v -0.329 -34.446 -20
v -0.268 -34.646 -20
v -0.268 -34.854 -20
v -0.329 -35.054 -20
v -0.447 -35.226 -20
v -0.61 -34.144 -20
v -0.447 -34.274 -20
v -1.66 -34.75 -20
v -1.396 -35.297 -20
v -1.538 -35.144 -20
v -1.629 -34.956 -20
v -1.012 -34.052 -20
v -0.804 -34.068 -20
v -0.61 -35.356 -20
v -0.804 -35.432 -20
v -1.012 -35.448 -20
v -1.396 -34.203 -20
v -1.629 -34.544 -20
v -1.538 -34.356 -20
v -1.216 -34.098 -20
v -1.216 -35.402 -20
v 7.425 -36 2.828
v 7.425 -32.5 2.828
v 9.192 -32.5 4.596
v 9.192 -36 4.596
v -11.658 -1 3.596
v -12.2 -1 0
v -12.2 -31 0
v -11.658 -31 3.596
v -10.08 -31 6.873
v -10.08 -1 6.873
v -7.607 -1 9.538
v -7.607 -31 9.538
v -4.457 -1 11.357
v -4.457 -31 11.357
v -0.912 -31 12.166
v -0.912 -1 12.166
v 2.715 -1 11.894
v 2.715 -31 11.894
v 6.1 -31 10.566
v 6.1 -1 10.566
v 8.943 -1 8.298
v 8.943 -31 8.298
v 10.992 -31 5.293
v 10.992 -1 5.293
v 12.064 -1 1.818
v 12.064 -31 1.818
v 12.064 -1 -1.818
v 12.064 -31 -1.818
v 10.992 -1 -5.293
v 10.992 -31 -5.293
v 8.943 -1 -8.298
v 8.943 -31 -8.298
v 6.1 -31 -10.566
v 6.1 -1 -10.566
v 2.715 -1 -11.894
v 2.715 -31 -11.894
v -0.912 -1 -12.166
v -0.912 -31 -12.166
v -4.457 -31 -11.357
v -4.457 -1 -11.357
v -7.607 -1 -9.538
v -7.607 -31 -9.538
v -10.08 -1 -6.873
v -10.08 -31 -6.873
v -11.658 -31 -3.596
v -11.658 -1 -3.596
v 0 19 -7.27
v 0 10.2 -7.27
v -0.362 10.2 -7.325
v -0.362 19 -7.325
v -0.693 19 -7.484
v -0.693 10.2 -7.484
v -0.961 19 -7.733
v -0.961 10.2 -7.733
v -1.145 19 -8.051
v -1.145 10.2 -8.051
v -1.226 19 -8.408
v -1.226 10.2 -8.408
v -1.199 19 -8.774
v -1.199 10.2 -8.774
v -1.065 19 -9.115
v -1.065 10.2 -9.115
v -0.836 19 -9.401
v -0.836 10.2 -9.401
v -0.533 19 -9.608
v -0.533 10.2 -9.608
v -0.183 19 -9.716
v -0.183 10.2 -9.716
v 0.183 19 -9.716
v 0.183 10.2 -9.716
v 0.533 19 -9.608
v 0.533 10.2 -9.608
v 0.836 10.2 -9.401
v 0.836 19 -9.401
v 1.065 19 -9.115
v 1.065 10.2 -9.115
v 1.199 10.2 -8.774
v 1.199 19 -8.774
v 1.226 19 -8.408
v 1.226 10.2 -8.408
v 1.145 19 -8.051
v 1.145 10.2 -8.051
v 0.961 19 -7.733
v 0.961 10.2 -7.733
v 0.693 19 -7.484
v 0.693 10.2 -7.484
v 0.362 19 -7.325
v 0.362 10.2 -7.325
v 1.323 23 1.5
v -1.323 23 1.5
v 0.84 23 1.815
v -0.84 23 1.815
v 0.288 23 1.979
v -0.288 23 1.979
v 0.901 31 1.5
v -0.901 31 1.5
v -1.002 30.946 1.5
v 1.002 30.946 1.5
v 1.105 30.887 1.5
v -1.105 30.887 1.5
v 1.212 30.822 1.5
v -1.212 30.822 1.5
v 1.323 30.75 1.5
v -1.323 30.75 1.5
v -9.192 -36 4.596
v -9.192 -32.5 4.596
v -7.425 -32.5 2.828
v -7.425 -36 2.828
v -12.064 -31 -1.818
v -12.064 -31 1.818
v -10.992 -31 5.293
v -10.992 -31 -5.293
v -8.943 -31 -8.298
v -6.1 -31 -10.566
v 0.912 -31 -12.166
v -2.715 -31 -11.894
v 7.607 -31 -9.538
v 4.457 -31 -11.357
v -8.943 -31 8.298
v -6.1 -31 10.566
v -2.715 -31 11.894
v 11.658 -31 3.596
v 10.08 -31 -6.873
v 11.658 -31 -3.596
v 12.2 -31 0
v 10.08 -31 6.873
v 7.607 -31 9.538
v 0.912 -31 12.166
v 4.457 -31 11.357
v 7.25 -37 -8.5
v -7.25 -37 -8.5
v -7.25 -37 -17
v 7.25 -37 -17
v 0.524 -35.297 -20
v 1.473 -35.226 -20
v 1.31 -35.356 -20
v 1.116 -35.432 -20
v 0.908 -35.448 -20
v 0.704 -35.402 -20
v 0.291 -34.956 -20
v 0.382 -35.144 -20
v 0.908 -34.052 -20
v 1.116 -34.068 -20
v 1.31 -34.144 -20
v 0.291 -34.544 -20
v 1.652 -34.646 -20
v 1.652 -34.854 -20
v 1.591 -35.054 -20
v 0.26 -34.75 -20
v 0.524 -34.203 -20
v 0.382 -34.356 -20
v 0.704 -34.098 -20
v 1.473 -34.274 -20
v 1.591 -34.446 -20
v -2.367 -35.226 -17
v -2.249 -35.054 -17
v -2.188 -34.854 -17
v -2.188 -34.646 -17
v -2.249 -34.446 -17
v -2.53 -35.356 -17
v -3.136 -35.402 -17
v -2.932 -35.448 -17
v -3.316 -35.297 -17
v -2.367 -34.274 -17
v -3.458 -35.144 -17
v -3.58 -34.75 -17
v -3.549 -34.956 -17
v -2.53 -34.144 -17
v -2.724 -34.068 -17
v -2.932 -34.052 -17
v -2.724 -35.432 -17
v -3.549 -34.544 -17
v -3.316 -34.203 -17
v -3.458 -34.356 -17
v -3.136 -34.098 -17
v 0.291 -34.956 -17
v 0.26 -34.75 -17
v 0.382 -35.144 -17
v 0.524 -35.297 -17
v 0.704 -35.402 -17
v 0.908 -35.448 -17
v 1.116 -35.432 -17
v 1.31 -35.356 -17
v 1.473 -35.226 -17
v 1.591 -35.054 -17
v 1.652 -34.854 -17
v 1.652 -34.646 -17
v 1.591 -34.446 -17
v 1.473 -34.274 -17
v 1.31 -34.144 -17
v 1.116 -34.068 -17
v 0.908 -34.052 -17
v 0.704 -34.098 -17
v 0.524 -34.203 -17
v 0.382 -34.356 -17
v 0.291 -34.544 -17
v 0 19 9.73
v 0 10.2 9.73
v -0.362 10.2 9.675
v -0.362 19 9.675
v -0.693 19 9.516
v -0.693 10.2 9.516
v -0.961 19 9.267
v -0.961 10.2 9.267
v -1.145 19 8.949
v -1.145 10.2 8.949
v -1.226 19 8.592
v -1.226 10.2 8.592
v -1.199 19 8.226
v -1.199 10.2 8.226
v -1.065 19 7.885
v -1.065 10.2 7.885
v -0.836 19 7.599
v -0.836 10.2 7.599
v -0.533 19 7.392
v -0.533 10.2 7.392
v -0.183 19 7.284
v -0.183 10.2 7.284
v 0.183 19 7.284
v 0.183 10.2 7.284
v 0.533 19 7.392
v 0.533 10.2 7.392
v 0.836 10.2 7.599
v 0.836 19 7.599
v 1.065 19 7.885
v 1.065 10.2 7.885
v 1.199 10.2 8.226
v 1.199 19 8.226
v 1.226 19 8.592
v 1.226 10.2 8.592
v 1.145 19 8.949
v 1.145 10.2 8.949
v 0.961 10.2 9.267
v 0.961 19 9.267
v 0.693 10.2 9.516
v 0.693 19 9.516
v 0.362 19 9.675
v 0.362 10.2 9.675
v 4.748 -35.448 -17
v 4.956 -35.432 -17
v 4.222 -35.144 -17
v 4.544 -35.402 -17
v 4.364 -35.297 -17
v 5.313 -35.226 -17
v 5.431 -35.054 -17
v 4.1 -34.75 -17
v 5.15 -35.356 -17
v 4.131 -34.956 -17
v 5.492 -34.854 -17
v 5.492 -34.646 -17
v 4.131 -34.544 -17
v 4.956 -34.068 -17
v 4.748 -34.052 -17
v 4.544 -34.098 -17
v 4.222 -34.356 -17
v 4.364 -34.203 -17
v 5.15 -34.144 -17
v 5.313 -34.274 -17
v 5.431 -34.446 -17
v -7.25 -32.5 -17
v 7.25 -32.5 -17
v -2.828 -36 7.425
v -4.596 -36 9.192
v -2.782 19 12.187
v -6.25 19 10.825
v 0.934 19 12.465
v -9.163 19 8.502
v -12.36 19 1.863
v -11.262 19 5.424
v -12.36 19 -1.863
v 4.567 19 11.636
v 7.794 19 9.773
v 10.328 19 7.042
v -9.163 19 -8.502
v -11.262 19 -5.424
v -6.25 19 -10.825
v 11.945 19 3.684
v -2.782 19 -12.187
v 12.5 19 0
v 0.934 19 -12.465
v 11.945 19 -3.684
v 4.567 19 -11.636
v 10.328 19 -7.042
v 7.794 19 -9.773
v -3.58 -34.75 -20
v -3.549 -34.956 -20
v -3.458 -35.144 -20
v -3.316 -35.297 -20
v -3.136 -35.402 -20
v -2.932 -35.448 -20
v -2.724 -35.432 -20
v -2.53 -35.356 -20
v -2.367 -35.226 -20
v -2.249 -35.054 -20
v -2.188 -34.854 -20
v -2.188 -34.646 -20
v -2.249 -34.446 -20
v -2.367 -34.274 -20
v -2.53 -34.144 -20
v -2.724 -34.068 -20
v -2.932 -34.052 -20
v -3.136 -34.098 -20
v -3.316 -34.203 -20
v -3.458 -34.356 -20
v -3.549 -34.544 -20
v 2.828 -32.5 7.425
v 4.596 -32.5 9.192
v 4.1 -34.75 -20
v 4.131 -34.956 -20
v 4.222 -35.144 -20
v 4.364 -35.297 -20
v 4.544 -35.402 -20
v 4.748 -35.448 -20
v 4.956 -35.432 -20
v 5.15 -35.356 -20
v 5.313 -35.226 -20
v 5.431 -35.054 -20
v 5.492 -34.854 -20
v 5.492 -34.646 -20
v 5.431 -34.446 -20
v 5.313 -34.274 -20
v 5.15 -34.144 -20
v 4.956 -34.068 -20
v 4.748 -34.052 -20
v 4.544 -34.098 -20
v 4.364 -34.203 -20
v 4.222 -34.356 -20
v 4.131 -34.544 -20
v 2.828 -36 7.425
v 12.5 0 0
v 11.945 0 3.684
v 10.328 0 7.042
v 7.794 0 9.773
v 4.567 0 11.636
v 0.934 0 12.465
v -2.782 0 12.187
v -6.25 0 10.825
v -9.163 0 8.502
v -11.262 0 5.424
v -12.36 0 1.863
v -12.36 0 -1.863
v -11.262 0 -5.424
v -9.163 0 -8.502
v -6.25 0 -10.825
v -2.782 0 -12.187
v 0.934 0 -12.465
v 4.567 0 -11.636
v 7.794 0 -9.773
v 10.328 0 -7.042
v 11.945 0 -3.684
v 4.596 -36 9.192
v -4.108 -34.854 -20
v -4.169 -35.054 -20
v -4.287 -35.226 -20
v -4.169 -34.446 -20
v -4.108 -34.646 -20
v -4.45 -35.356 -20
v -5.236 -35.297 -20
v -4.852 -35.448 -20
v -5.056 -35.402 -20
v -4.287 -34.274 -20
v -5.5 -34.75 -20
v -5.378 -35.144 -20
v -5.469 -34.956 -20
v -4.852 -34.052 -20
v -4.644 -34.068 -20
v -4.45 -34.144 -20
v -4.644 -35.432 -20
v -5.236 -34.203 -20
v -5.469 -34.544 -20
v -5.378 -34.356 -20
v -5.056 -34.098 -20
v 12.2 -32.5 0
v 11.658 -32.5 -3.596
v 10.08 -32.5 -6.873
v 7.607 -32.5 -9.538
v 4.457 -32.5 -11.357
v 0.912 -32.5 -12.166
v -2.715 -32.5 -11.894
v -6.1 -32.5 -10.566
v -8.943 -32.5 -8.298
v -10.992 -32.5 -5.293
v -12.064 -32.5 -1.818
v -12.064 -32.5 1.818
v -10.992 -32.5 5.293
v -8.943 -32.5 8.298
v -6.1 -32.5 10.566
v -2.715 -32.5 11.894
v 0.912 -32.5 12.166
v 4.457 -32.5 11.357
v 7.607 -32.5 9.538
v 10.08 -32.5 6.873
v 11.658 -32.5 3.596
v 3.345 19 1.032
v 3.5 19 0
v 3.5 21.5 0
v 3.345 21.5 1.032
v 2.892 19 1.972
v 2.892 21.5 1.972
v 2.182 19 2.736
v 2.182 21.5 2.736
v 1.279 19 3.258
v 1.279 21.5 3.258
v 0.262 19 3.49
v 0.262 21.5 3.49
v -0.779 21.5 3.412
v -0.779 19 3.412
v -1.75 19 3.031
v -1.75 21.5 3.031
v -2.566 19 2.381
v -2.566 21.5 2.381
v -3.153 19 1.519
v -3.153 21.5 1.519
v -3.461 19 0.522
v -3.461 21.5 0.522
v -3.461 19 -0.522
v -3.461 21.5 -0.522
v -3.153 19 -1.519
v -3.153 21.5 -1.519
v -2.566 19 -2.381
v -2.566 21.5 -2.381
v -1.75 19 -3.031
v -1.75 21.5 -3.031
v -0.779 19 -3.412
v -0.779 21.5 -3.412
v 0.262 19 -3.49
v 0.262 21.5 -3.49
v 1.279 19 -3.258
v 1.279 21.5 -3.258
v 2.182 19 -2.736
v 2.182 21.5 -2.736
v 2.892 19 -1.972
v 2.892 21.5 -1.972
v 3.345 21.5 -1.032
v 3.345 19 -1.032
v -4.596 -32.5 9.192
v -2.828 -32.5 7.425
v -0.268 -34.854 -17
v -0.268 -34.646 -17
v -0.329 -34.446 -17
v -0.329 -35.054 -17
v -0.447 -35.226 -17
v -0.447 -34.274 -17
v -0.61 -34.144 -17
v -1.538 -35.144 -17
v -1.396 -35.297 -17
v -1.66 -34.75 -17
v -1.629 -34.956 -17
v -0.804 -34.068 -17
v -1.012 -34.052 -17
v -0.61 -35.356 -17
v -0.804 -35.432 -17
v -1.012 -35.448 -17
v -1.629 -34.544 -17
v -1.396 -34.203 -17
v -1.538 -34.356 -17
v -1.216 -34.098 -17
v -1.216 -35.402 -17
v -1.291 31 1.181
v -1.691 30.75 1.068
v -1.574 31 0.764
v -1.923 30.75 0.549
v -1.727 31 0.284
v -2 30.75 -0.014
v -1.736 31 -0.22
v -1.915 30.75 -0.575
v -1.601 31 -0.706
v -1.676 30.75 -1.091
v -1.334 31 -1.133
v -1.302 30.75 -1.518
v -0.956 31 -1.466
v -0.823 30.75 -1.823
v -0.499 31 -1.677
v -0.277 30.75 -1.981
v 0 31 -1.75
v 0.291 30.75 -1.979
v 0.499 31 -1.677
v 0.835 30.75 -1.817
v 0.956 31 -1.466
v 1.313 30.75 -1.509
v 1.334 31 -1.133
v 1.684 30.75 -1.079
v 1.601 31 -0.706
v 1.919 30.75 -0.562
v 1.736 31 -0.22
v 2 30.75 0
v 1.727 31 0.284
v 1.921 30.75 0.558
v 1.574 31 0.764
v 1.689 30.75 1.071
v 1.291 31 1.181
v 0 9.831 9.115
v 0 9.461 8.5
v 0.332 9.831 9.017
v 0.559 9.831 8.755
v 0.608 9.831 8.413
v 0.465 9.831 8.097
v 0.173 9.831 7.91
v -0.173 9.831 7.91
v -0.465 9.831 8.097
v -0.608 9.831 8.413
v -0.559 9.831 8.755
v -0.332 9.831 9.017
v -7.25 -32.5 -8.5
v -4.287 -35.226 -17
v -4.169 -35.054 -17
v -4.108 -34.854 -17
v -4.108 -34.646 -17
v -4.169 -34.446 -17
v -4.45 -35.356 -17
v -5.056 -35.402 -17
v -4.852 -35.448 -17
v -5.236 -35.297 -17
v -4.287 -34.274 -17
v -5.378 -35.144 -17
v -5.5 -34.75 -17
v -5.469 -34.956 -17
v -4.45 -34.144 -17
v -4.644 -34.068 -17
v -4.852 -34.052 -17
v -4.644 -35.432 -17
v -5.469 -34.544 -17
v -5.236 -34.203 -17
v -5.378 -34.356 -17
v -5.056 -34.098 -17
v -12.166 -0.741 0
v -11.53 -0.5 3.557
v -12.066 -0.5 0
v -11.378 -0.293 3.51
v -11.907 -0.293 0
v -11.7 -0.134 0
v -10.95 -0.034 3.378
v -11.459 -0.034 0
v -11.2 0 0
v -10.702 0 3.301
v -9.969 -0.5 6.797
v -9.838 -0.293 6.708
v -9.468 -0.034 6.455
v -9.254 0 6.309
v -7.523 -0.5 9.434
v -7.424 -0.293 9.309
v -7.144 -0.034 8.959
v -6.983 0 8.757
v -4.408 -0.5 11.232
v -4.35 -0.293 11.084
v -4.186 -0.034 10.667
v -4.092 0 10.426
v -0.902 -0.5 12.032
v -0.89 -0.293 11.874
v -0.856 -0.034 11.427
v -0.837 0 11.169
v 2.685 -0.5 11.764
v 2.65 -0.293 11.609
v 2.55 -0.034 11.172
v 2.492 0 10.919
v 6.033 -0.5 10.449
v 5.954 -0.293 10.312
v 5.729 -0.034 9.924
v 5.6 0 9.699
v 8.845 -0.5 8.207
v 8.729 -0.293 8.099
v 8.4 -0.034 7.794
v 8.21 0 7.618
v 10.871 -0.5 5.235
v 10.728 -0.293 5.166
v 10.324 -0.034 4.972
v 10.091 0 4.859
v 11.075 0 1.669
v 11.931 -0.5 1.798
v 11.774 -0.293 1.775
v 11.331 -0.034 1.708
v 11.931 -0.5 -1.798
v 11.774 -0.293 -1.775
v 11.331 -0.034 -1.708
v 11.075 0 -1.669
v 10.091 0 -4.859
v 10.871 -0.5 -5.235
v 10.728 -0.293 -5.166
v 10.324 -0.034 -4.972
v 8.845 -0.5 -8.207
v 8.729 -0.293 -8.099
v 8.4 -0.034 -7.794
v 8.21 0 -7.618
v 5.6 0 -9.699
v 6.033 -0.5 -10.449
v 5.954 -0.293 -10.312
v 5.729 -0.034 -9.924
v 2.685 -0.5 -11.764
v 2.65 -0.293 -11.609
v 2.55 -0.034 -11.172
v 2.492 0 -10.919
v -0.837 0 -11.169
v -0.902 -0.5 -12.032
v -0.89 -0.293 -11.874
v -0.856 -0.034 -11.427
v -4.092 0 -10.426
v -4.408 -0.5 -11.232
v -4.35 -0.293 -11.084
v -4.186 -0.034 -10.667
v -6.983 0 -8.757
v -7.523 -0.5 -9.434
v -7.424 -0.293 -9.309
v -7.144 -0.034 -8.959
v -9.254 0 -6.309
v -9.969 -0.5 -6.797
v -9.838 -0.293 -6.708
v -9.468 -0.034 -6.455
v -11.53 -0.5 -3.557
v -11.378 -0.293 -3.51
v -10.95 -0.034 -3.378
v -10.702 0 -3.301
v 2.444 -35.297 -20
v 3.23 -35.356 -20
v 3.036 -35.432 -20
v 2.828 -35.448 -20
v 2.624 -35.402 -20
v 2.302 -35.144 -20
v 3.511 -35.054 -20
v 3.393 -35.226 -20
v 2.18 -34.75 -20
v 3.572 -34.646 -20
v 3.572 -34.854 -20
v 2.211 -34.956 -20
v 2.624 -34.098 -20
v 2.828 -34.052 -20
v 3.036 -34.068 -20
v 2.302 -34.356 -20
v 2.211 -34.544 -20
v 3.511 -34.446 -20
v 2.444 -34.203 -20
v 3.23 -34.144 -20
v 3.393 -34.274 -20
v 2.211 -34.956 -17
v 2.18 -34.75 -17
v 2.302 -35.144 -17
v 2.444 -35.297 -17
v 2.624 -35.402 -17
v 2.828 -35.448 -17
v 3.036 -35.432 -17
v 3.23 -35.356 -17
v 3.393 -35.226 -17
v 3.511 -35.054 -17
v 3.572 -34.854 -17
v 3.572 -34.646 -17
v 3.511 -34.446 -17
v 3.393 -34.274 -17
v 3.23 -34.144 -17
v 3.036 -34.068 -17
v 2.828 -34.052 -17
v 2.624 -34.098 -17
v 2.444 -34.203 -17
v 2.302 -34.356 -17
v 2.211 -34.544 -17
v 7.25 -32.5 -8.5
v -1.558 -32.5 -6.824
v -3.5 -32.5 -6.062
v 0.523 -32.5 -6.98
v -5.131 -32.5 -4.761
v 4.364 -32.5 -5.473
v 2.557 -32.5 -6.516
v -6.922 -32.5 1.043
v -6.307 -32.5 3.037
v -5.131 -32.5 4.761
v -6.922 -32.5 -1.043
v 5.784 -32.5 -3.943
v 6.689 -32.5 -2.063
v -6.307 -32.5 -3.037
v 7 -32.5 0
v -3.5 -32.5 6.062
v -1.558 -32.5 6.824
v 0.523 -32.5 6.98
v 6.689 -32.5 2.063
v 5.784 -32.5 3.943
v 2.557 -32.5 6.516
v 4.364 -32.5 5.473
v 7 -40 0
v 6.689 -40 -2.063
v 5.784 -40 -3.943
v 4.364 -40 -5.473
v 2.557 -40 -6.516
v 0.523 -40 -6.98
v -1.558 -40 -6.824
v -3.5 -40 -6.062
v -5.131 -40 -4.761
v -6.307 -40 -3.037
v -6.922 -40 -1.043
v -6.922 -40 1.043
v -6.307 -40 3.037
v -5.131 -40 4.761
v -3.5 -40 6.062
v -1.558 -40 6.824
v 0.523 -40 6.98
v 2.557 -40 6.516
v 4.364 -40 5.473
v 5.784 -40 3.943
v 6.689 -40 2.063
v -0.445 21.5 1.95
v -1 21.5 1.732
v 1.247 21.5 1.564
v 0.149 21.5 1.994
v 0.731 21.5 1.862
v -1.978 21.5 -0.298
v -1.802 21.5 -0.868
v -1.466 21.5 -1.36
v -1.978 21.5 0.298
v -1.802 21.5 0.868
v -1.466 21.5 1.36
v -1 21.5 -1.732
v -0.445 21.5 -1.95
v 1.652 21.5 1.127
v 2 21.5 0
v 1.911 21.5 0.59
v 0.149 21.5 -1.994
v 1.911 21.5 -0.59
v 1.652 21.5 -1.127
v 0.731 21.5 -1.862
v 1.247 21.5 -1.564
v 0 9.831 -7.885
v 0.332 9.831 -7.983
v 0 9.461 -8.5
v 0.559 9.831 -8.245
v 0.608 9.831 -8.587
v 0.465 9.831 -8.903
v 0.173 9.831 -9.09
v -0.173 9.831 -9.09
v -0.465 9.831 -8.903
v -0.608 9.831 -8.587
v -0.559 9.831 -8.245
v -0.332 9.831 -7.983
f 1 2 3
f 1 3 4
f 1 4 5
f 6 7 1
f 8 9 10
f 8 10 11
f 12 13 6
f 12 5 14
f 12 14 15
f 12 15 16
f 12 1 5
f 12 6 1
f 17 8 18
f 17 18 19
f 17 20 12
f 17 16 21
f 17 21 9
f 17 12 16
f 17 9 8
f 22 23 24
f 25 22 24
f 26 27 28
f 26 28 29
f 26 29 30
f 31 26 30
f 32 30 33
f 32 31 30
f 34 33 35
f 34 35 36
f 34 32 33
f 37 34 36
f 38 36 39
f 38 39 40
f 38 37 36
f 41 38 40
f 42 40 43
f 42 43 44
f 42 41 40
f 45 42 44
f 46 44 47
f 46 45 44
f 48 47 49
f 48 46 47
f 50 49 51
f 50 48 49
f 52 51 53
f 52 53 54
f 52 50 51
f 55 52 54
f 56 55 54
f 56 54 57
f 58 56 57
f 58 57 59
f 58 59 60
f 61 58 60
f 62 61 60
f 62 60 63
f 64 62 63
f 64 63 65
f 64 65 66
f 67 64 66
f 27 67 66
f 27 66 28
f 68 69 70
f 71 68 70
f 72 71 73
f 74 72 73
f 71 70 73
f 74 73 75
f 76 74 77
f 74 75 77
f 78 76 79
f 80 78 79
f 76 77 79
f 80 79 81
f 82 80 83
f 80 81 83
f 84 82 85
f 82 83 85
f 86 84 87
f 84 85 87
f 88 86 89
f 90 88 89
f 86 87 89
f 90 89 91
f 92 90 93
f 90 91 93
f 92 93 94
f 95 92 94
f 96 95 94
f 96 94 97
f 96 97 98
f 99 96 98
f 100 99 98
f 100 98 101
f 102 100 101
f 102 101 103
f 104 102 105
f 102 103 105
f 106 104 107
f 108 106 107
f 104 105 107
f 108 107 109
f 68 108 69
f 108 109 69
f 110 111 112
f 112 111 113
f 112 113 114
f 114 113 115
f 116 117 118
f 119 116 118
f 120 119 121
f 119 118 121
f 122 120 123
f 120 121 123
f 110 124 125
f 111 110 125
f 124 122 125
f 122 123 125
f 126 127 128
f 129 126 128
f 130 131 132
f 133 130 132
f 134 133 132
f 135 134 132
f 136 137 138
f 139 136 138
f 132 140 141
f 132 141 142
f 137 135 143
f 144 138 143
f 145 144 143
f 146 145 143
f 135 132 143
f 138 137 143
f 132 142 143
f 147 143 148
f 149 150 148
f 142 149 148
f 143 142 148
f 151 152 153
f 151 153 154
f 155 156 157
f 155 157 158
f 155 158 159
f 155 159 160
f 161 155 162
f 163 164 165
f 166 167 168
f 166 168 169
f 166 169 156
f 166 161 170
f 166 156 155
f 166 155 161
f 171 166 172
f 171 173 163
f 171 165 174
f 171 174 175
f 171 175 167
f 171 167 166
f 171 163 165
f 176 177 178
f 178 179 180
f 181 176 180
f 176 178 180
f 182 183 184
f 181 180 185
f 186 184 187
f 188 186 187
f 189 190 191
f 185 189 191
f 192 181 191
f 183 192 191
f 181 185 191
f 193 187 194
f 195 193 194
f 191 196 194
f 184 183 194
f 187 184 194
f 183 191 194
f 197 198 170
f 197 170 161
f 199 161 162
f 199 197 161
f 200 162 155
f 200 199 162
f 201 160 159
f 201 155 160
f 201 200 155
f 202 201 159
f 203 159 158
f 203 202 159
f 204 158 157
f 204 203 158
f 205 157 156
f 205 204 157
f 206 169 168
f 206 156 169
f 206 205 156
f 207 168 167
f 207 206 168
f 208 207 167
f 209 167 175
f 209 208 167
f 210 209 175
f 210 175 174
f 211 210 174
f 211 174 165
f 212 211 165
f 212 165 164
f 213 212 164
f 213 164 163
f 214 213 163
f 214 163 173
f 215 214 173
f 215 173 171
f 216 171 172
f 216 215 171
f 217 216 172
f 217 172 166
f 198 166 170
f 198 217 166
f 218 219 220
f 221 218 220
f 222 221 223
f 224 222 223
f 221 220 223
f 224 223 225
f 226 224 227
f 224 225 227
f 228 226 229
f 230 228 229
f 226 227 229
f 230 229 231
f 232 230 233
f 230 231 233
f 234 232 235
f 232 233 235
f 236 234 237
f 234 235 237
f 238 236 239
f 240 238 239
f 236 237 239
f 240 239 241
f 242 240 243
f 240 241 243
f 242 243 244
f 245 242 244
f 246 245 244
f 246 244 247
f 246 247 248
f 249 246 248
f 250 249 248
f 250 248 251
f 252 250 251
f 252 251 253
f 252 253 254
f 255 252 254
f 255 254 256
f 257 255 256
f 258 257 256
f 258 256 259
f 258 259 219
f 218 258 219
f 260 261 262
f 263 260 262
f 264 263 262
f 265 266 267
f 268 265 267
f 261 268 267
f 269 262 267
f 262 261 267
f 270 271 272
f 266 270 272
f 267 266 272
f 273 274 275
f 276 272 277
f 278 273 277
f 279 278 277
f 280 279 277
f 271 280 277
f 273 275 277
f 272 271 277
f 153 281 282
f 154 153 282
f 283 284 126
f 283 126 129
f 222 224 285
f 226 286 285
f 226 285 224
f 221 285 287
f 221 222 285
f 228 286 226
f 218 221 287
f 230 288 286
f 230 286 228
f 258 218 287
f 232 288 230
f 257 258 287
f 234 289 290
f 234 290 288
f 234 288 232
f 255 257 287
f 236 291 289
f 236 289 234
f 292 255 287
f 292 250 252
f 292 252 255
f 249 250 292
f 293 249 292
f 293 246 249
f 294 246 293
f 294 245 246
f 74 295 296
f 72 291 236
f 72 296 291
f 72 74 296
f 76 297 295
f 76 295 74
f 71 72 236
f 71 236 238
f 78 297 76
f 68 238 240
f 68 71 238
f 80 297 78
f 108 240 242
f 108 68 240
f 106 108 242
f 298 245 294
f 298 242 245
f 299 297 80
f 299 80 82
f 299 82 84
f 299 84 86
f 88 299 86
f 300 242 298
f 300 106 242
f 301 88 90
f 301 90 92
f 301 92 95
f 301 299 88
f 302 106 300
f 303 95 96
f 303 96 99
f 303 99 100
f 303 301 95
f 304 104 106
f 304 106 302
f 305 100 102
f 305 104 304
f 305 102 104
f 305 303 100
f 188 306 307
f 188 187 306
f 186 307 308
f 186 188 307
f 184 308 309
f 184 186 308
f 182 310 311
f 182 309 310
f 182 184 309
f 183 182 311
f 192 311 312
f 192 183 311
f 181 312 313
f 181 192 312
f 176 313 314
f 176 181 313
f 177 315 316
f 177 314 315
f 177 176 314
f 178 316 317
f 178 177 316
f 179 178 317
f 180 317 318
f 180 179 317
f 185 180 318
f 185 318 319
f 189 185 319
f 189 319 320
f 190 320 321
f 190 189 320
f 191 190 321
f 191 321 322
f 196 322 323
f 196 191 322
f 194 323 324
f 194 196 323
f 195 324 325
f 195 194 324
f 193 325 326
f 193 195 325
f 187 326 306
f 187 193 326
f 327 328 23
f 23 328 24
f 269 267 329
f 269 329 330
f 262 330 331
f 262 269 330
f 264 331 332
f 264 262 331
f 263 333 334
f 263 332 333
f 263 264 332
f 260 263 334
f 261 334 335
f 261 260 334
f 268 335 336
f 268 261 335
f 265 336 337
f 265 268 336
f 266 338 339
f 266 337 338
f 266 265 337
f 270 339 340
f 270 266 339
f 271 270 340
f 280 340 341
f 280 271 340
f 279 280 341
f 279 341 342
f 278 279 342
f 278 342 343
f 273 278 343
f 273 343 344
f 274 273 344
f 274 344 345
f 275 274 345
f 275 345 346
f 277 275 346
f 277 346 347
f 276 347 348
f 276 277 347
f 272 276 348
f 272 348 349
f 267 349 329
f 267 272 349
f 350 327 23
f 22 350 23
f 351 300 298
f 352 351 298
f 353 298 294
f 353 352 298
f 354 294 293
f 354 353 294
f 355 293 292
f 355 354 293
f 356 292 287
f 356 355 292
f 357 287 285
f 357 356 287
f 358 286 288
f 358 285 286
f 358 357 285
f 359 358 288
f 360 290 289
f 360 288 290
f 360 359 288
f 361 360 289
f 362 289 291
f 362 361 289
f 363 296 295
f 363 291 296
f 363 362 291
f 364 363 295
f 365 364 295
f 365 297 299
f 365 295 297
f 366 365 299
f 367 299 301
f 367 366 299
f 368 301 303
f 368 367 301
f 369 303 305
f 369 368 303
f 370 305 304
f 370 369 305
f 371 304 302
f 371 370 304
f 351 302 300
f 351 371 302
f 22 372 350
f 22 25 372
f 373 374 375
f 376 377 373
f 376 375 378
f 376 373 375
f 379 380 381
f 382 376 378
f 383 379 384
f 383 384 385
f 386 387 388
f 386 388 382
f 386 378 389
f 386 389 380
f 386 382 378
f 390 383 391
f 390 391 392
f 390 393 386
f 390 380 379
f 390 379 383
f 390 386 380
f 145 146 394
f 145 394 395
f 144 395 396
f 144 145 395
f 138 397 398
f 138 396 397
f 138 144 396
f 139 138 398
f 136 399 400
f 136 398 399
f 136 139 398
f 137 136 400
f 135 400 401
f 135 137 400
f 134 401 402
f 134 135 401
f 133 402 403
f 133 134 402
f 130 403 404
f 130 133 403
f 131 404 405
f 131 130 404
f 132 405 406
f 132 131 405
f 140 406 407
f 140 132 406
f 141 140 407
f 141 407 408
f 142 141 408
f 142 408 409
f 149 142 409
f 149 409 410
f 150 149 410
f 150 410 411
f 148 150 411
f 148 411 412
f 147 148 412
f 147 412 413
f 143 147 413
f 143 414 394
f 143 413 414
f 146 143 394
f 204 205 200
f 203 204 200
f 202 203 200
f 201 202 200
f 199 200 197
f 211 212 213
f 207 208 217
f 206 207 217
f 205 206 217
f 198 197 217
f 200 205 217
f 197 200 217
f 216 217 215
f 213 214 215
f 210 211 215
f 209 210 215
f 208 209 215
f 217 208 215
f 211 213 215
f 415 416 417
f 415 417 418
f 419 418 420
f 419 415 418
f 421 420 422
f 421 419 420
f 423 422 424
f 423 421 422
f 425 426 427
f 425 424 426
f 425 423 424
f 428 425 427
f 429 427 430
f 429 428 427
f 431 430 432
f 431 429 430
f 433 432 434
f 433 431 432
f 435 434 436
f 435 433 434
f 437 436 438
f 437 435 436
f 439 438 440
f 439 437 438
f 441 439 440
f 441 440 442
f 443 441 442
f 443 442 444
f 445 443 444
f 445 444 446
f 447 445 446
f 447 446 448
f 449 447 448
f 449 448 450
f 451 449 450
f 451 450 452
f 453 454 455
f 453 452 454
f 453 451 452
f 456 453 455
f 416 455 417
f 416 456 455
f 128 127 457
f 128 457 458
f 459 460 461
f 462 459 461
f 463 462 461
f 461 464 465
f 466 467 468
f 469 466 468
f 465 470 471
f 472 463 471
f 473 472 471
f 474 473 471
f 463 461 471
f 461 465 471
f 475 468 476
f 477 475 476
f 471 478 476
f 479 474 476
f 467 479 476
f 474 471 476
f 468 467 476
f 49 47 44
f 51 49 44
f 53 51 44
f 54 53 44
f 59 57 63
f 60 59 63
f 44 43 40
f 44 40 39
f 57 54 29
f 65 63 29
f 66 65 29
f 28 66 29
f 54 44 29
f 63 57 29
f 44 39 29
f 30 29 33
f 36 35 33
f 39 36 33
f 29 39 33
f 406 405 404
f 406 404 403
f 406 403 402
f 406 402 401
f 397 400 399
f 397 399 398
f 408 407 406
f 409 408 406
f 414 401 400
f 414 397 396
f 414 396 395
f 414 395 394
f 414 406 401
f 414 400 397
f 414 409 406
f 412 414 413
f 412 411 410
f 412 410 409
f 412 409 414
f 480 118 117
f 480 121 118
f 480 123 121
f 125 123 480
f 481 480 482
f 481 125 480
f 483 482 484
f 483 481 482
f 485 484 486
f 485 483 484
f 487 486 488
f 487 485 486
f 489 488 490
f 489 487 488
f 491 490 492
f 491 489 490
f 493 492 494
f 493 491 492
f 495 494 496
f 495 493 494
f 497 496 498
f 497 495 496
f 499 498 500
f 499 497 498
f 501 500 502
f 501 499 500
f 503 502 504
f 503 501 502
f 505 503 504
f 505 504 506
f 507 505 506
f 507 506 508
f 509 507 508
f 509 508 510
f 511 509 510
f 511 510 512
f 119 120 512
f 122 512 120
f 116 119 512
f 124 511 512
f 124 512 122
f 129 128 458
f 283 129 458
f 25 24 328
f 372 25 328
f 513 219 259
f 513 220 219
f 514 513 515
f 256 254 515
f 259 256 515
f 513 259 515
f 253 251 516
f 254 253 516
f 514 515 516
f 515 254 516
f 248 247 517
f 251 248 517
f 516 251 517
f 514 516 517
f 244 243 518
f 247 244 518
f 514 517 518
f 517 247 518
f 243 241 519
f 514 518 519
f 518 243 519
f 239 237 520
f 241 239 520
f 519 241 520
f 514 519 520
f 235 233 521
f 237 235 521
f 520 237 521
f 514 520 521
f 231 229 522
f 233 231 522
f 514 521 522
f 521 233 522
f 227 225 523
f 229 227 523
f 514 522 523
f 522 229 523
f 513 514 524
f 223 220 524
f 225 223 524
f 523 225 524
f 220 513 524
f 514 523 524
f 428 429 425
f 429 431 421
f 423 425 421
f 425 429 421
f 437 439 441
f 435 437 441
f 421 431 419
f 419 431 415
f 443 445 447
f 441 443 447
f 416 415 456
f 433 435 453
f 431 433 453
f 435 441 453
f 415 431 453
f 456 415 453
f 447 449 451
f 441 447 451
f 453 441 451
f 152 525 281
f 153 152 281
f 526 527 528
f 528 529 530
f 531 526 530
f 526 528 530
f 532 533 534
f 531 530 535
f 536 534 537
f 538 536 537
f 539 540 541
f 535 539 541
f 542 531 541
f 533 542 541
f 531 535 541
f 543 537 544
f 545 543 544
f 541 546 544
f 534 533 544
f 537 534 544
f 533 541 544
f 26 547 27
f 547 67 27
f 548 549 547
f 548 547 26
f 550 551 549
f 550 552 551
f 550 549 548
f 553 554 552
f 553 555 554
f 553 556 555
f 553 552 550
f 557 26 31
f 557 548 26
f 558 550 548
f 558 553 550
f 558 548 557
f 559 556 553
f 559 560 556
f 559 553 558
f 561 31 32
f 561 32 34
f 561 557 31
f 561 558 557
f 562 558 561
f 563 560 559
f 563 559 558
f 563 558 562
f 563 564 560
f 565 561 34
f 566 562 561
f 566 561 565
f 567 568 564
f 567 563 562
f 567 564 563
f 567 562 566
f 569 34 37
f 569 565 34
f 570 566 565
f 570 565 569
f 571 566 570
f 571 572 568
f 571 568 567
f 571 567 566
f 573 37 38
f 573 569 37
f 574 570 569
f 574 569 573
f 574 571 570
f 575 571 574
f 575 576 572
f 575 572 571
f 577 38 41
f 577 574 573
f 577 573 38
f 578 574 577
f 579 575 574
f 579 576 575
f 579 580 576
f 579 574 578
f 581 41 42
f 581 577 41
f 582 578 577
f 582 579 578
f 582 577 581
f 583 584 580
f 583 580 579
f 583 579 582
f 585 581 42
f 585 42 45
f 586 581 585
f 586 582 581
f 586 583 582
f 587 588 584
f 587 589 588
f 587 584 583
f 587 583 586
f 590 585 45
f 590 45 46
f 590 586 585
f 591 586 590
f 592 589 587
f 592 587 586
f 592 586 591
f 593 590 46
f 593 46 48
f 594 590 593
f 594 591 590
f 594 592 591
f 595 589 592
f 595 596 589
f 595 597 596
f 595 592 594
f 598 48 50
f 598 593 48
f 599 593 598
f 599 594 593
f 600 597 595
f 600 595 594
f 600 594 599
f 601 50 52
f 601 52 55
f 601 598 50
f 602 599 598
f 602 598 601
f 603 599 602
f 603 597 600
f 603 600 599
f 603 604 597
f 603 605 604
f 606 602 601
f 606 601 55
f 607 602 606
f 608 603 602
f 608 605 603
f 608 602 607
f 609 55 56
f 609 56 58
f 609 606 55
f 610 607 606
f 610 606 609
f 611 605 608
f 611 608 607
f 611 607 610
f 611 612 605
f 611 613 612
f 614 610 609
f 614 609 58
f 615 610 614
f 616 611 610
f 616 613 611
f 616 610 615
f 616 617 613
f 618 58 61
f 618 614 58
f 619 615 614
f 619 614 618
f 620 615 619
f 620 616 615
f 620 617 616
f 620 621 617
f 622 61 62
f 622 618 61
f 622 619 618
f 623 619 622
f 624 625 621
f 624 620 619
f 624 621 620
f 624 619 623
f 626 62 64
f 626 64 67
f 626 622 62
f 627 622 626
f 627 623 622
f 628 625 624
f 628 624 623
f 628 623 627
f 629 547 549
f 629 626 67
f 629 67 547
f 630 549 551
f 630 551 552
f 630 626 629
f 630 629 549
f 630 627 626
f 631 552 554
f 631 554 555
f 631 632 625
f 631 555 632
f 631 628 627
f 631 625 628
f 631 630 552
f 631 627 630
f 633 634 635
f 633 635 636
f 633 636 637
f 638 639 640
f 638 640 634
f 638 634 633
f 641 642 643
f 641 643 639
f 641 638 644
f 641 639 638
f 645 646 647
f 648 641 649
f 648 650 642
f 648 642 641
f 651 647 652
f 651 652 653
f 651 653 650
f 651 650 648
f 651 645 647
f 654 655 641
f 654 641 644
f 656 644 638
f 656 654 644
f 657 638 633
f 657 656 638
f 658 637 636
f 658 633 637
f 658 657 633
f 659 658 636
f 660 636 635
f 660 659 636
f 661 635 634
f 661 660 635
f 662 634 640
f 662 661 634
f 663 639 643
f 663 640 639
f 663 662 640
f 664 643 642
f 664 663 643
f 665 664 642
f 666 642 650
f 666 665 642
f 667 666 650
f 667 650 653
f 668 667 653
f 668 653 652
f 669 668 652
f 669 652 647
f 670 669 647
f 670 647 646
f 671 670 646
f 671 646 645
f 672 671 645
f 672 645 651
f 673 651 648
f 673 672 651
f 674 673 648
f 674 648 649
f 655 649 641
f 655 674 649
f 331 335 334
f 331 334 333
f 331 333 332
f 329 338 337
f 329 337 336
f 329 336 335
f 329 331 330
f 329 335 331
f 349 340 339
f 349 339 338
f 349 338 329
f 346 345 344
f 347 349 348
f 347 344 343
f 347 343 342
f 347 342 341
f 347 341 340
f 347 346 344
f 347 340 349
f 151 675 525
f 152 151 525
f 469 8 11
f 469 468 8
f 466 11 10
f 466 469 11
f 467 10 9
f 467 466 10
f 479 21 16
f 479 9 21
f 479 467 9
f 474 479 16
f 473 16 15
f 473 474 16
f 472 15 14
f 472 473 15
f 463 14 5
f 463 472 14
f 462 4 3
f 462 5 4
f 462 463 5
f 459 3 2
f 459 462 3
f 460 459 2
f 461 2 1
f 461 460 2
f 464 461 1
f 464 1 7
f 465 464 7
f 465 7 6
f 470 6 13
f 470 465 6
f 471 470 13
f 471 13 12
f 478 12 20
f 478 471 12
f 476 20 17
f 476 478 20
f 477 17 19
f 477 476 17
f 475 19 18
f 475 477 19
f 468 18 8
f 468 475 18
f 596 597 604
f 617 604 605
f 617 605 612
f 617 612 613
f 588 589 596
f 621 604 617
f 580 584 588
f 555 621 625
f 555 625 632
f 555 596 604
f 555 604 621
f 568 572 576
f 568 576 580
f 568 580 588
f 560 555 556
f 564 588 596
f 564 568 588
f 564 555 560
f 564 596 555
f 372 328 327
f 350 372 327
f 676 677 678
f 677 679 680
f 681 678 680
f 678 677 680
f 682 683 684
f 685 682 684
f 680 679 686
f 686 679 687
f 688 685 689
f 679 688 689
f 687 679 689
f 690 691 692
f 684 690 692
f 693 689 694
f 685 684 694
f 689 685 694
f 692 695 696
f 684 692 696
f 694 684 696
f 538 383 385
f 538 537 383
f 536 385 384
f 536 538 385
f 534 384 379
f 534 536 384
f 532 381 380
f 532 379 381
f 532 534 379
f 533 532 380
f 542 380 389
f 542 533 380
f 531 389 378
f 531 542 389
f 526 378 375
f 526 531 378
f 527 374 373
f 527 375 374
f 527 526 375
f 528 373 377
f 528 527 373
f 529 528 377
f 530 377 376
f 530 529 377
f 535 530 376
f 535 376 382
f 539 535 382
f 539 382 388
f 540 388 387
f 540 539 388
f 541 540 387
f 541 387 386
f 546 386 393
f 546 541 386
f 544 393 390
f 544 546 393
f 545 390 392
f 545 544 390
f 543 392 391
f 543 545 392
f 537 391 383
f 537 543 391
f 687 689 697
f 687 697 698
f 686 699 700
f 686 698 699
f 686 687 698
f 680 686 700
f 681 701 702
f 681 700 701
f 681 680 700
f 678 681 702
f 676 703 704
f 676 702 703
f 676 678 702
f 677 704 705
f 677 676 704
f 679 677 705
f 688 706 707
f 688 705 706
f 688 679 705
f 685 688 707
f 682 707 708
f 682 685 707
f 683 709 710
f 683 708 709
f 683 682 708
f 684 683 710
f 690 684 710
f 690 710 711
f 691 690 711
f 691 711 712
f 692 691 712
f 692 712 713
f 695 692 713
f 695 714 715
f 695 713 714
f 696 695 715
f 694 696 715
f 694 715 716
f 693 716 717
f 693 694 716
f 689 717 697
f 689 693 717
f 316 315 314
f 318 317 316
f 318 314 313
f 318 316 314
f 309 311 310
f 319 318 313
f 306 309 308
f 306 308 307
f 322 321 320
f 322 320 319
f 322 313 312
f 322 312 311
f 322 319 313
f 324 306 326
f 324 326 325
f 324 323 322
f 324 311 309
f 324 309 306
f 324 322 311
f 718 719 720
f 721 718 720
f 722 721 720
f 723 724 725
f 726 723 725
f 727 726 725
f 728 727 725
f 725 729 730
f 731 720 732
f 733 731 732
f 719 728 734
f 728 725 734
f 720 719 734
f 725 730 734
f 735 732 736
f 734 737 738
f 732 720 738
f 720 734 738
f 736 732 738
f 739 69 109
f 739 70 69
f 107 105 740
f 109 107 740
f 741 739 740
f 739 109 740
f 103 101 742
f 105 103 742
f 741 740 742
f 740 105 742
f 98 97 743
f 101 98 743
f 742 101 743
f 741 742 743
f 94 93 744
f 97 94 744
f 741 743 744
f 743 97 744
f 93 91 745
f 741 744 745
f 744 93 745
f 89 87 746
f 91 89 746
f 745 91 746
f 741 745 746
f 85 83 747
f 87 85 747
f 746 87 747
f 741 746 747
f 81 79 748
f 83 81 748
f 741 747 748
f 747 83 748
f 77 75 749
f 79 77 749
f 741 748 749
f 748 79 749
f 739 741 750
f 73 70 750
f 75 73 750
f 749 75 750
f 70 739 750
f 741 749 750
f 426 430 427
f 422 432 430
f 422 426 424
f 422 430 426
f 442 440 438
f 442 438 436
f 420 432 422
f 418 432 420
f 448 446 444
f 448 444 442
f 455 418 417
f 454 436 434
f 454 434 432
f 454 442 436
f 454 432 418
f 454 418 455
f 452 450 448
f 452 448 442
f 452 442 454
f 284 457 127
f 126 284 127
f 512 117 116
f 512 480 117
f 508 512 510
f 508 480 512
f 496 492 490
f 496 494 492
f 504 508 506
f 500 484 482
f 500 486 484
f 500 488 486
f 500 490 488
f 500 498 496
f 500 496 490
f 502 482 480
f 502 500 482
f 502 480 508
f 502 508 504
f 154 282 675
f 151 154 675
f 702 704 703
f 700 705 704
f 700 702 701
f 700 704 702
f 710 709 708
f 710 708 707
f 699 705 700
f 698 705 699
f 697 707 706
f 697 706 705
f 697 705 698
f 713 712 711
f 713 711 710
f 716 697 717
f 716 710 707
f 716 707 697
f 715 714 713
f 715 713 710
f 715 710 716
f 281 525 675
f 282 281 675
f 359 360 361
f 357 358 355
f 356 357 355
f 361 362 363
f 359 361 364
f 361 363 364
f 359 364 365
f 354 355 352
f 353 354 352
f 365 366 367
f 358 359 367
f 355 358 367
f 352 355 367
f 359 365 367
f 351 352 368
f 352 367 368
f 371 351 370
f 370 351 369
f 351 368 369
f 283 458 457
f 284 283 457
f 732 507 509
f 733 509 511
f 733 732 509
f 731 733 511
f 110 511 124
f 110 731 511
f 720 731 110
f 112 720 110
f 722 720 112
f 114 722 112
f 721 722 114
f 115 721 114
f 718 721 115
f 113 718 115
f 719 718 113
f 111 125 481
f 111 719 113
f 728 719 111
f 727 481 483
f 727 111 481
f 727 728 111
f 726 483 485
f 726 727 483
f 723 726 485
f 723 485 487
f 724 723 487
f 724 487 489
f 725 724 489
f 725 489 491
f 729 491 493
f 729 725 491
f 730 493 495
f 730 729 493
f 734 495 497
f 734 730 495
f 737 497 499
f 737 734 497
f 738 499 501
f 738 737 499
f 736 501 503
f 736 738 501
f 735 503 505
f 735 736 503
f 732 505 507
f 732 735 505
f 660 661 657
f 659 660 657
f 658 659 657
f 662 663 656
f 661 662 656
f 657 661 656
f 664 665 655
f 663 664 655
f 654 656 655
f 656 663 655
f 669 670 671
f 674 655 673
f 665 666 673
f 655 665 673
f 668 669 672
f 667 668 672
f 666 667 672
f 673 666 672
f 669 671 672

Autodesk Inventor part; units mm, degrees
ref_plane "YZ Plane" through (0, 0, 0) normal (1, 0, 0) x (0, 1, 0)
ref_plane "XZ Plane" through (0, 0, 0) normal (0, 1, 0) x (-1, 0, 0)
ref_plane "XY Plane" through (0, 0, 0) normal (0, 0, 1) x (1, 0, 0)
sketch "Sketch1" plane through (0, 0, 0) normal (0, 1, 0) x (-1, 0, 0)
  circle A0 centre (0, 0) radius 12.2
  dimension "d0" = 24.4
extrude "Extrusion1" add sketch "Sketch1" against normal blind 31
fillet "Fillet1" radius 1 1 edges at (12.2, 0, 0)
sketch "Sketch2" plane through (0, -31, 0) normal (0, -1, 0) x (1, 0, 0)
  circle A0 centre (0, 0) radius 12.2 projected
extrude "Extrusion2" add sketch "Sketch2" along normal blind 1.5 separate body
sketch "Sketch3" plane through (0, -32.5, 0) normal (0, -1, 0) x (1, 0, 0)
  circle A0 centre (0, 0) radius 7
  dimension "d6" = 14
extrude "Extrusion3" add sketch "Sketch3" along normal blind 7.5 separate body
sketch "Sketch4" plane through (0, -32.5, 0) normal (0, -1, 0) x (1, 0, 0)
  circle A0 centre (0, 0) radius 6.75 construction
  line L0 (-7.4246, 2.8284) -> (-2.8284, 7.4246)
  line L1 (-2.8284, 7.4246) -> (-4.5962, 9.1924)
  line L2 (-4.5962, 9.1924) -> (-9.1924, 4.5962)
  line L3 (-9.1924, 4.5962) -> (-7.4246, 2.8284)
  line L4 (-7.4246, 2.8284) -> (-4.5962, 9.1924) construction
  line L5 (-2.8284, 7.4246) -> (-9.1924, 4.5962) construction
  line L6 (0, 0) -> (-6.0104, 6.0104) construction
  line L7 (0, 0) -> (-12.2, 0) construction
  circle A1 centre (0, 0) radius 12.2 construction
  point P0 (4.773, -4.773)
  dimension "d9" = 13.5
  dimension "d10" = 6.5
  dimension "d11" = 2.5
  dimension "d12" = 45
  dimension "d13" = 16.5
extrude "Extrusion4" add sketch "Sketch4" along normal blind 3.5 separate body
pattern_circular "Circular Pattern1" count 2 over 90 about axis through (0, -32.5, 0) along (0, 1, 0) of "Extrusion4" bodies 4
sketch "Sketch5" plane through (0, -32.5, 0) normal (0, -1, 0) x (1, 0, 0)
  line L0 (-7.25, -17) -> (7.25, -17)
  line L1 (7.25, -17) -> (7.25, -8.5)
  line L2 (7.25, -8.5) -> (-7.25, -8.5)
  line L3 (-7.25, -8.5) -> (-7.25, -17)
  line L4 (-7.25, -17) -> (7.25, -8.5) construction
  line L5 (7.25, -17) -> (-7.25, -8.5) construction
  circle A0 centre (0, 0) radius 7 projected
  point P0 (0, -12.75)
  point P1 (0, -12.75)
  dimension "d19" = 17
  dimension "d20" = 8.5
  dimension "d21" = 14.5
extrude "Extrusion5" add sketch "Sketch5" along normal blind 4.5 separate body contours L3 L2 L1 L0
sketch "Sketch6" plane through (7.25, -32.5, -17) normal (0, 0, -1) x (-1, 0, 0)
  line L0 (12.05, -2.25) -> (10.13, -2.25) construction
  line L1 (10.13, -2.25) -> (8.21, -2.25) construction
  line L2 (8.21, -2.25) -> (6.29, -2.25) construction
  line L3 (6.29, -2.25) -> (4.37, -2.25) construction
  line L4 (4.37, -2.25) -> (2.45, -2.25) construction
  circle A0 centre (12.05, -2.25) radius 0.7
  circle A1 centre (10.13, -2.25) radius 0.7
  circle A2 centre (8.21, -2.25) radius 0.7
  circle A3 centre (6.29, -2.25) radius 0.7
  circle A4 centre (4.37, -2.25) radius 0.7
  circle A5 centre (2.45, -2.25) radius 0.7
  line L5 (14.5, 0) -> (14.5, -4.5) projected
  line L6 (14.5, -4.5) -> (0, -4.5) projected
  point P0 (7.25, 32.5)
  point P1 (14.5, -2.25)
  point P2 (7.25, -2.25)
  point P3 (7.25, -4.5)
  dimension "d24" = 9.6
  dimension "d25" = 1.4
extrude "Extrusion6" add sketch "Sketch6" along normal blind 3 separate body contours A0
extrude "Extrusion7" add sketch "Sketch6" along normal blind 3 separate body contours A1
extrude "Extrusion8" add sketch "Sketch6" along normal blind 3 separate body contours A2
extrude "Extrusion9" add sketch "Sketch6" along normal blind 3 separate body contours A3
extrude "Extrusion10" add sketch "Sketch6" along normal blind 3 separate body contours A4
extrude "Extrusion11" add sketch "Sketch6" along normal blind 3 separate body contours A5
sketch "Sketch7" plane through (0, 0, 0) normal (0, 1, 0) x (1, 0, 0)
  circle A0 centre (0, 0) radius 12.5
  dimension "d38" = 25
extrude "Extrusion12" add sketch "Sketch7" along normal blind 19 separate body
sketch "Sketch8" plane through (0, 19, 0) normal (0, 1, 0) x (1, 0, 0)
  circle A0 centre (0, 0) radius 11.2 construction
  circle A1 centre (0, 0) radius 3.5
  dimension "d41" = 7
extrude "Extrusion13" add sketch "Sketch8" along normal blind 2.5 separate body
sketch "Sketch9" plane through (0, 21.5, 0) normal (0, 1, 0) x (1, 0, 0)
  circle A0 centre (0, 0) radius 2
  dimension "d44" = 4
extrude "Extrusion14" add sketch "Sketch9" along normal blind 9.5 separate body
chamfer "Chamfer1" distance 0.25 angle 45 1 edges at (-2, 31, 0)
sketch "Sketch10" plane through (0, 31, 0) normal (0, 1, 0) x (1, 0, 0)
  line L0 (-1.3229, -2) -> (1.3229, -2)
  line L1 (1.3229, -2) -> (1.3229, -1.5)
  line L2 (1.3229, -1.5) -> (-1.3229, -1.5)
  line L3 (-1.3229, -1.5) -> (-1.3229, -2)
  circle A0 centre (0, 0) radius 2 construction
  dimension "d50" = 1.5
extrude "Extrusion15" cut sketch "Sketch10" against normal blind 8 bodies 14
sketch "Sketch11" plane through (0, 19, 0) normal (0, 1, 0) x (1, 0, 0)
  circle A0 centre (0, 0) radius 12.5 construction
  line L0 (0, 8.5) -> (0, -8.5) construction
  line L1 (7.25, 8.5) -> (-7.25, 8.5) construction
  dimension "d53" = 17
hole "Hole1" at (0, 19, -8.5) at (0, 19, 8.5) direction (0, -1, 0) diameter 2.459 depth 8.8 tip angle 118 bodies 12 thread size "M3x0.5" class "6H" standard "ISO Metric profile"
properties part number "JGA25-371_12VDC_230RPM"
